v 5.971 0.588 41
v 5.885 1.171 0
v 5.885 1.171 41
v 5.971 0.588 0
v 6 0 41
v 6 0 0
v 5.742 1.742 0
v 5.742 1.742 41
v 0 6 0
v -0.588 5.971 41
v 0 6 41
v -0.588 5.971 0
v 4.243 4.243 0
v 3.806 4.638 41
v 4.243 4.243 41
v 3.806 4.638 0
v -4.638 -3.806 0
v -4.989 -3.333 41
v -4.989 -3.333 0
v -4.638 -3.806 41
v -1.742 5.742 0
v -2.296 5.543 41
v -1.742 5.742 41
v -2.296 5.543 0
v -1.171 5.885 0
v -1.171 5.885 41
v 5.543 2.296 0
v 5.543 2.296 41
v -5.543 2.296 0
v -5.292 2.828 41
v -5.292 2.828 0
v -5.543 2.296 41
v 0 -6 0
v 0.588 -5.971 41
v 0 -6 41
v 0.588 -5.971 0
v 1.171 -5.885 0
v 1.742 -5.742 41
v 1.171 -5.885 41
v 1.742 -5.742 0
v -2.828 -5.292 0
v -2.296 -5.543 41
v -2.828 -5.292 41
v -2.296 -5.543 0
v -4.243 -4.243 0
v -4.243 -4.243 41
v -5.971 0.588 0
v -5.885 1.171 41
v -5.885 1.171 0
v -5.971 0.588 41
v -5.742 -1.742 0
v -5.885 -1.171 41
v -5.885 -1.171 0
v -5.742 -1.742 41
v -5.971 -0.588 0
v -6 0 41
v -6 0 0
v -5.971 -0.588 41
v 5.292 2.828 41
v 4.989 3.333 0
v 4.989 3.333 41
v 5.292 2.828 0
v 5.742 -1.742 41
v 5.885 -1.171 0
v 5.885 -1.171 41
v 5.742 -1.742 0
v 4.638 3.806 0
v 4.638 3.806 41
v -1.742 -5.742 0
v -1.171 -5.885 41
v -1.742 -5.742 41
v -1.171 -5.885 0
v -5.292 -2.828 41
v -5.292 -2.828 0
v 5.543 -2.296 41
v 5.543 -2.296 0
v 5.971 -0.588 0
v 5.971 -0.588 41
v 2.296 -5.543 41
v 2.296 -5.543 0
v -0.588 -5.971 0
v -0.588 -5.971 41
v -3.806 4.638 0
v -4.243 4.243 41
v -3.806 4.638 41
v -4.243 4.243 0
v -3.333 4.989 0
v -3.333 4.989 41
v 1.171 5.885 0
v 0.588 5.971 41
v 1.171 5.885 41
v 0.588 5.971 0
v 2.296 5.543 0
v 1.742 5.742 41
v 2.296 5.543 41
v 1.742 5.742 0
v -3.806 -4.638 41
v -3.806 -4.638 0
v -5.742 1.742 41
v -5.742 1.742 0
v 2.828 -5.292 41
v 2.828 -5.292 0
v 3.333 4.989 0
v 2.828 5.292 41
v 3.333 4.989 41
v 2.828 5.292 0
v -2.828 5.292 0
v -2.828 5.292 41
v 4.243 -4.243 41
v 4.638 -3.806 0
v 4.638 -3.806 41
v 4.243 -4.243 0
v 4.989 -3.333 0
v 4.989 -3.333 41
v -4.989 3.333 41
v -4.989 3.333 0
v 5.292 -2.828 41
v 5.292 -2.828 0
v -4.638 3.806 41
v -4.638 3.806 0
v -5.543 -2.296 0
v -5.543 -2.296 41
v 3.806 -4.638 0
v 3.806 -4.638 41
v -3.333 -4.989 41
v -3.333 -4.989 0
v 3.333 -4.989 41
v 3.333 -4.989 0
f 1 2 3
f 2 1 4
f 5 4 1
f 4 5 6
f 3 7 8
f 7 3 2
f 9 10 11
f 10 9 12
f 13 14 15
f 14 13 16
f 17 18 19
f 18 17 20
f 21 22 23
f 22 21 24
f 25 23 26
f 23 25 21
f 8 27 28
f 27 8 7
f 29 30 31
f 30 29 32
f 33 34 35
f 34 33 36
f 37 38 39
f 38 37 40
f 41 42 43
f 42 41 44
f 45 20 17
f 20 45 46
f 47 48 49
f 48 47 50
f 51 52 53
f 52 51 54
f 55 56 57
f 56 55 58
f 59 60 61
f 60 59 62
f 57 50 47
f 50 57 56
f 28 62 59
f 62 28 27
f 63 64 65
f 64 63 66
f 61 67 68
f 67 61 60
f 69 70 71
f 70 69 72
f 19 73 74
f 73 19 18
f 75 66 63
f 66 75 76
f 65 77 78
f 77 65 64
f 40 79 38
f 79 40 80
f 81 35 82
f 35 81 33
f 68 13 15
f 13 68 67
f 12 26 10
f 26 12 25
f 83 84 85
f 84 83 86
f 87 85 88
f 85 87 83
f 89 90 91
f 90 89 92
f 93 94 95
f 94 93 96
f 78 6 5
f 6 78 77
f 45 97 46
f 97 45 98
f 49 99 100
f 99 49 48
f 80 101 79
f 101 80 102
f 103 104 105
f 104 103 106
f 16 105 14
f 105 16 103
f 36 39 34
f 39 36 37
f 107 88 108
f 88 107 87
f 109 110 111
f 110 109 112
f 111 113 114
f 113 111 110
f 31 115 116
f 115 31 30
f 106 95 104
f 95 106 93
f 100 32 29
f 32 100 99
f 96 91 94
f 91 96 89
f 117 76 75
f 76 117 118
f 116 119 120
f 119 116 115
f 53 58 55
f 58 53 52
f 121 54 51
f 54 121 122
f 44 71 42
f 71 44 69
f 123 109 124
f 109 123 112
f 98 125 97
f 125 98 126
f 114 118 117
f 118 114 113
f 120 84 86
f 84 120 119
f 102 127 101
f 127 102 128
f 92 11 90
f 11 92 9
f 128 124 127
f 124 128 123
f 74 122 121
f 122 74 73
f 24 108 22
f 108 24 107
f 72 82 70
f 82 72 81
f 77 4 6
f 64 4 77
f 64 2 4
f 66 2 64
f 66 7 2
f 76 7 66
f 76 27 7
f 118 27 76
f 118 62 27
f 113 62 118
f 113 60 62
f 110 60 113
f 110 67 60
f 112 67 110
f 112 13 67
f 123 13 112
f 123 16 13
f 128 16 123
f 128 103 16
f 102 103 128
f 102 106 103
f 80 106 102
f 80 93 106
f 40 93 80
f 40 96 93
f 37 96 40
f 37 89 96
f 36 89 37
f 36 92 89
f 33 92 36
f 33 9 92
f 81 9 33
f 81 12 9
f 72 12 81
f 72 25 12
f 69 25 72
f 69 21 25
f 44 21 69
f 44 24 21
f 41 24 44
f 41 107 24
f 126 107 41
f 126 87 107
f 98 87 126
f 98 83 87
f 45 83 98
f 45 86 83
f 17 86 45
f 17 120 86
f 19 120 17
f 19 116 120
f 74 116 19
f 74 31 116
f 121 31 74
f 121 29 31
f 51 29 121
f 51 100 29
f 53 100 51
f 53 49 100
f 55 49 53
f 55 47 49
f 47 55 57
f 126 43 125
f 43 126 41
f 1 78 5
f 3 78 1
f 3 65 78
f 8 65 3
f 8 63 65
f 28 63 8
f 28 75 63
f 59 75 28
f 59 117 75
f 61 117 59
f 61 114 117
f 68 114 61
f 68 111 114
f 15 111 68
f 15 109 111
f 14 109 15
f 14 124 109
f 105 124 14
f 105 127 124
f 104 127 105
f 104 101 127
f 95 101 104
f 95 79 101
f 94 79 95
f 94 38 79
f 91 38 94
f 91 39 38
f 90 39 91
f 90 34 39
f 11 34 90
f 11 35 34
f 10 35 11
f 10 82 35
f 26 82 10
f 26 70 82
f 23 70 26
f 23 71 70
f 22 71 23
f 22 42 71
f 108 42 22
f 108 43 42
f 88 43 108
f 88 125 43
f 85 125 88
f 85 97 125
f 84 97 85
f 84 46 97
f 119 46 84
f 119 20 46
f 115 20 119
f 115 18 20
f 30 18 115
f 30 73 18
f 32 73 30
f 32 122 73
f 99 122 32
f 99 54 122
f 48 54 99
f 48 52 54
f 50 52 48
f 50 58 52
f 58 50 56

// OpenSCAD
$fn = 64;

// Dimensions
bore_diameter = 3;
collar_diameter = 12;
collar_height = 5;
barb8_height = 10;
barb8_bottom_diameter = 7.5;
barb8_top_diameter = 9.5;
barb5_height = 8;
barb5_bottom_diameter = 6.5;
barb5_top_diameter = 5.0;
total_height = 41;

// Helper function to create a single sawtooth barb
module sawtooth_barb(bottom_diameter, top_diameter, height, z_offset) {
    // Calculate slope for linear increase
    slope = (top_diameter - bottom_diameter) / height;
    
    // Create the increasing part (bottom to top)
    translate([0, 0, z_offset])
        linear_extrude(height = height, scale = (top_diameter/bottom_diameter))
            circle(d = bottom_diameter, $fn = 64);
    
    // Create the decreasing part (top back to bottom diameter)
    // We need to subtract the decreasing part from the increasing part to get the sawtooth step
    // Instead, we'll build it as two parts: increasing then decreasing with a step
    // But simpler: use hull for the step transition
    hull() {
        translate([0, 0, z_offset + height])
            circle(d = top_diameter, $fn = 64);
        translate([0, 0, z_offset + height + 0.01])
            circle(d = bottom_diameter, $fn = 64);
    }
}

// Main body: cylinder with bore
module main_body() {
    // Base cylinder (from z=0 to z=20)
    difference() {
        cylinder(h = 20, d = 12, $fn = 64);
        translate([0, 0, -0.01])
            cylinder(h = 20.02, d = bore_diameter, $fn = 64);
    }
    
    // Collar section (z=20 to z=25)
    translate([0, 0, 20])
        cylinder(h = collar_height, d = collar_diameter, $fn = 64);
    
    // Top section (z=25 to z=41)
    translate([0, 0, 25])
        cylinder(h = 16, d = 12, $fn = 64);
}

// 8mm barbs (z=0 to z=20)
module barbs_8mm() {
    // First barb (bottom)
    translate([0, 0, 0])
        sawtooth_barb(barb8_bottom_diameter, barb8_top_diameter, barb8_height, 0);
    
    // Second barb (top)
    translate([0, 0, barb8_height])
        sawtooth_barb(barb8_bottom_diameter, barb8_top_diameter, barb8_height, 0);
}

// 5mm barbs (z=25 to z=41)
module barbs_5mm() {
    // First barb (bottom)
    translate([0, 0, 25])
        sawtooth_barb(barb5_bottom_diameter, barb5_top_diameter, barb5_height, 0);
    
    // Second barb (top)
    translate([0, 0, 25 + barb5_height])
        sawtooth_barb(barb5_bottom_diameter, barb5_top_diameter, barb5_height, 0);
}

// Combine everything
module reducer() {
    // Create main body with bore
    main_body();
    
    // Add 8mm barbs
    barbs_8mm();
    
    // Add 5mm barbs
    barbs_5mm();
}

// Final part
reducer();
